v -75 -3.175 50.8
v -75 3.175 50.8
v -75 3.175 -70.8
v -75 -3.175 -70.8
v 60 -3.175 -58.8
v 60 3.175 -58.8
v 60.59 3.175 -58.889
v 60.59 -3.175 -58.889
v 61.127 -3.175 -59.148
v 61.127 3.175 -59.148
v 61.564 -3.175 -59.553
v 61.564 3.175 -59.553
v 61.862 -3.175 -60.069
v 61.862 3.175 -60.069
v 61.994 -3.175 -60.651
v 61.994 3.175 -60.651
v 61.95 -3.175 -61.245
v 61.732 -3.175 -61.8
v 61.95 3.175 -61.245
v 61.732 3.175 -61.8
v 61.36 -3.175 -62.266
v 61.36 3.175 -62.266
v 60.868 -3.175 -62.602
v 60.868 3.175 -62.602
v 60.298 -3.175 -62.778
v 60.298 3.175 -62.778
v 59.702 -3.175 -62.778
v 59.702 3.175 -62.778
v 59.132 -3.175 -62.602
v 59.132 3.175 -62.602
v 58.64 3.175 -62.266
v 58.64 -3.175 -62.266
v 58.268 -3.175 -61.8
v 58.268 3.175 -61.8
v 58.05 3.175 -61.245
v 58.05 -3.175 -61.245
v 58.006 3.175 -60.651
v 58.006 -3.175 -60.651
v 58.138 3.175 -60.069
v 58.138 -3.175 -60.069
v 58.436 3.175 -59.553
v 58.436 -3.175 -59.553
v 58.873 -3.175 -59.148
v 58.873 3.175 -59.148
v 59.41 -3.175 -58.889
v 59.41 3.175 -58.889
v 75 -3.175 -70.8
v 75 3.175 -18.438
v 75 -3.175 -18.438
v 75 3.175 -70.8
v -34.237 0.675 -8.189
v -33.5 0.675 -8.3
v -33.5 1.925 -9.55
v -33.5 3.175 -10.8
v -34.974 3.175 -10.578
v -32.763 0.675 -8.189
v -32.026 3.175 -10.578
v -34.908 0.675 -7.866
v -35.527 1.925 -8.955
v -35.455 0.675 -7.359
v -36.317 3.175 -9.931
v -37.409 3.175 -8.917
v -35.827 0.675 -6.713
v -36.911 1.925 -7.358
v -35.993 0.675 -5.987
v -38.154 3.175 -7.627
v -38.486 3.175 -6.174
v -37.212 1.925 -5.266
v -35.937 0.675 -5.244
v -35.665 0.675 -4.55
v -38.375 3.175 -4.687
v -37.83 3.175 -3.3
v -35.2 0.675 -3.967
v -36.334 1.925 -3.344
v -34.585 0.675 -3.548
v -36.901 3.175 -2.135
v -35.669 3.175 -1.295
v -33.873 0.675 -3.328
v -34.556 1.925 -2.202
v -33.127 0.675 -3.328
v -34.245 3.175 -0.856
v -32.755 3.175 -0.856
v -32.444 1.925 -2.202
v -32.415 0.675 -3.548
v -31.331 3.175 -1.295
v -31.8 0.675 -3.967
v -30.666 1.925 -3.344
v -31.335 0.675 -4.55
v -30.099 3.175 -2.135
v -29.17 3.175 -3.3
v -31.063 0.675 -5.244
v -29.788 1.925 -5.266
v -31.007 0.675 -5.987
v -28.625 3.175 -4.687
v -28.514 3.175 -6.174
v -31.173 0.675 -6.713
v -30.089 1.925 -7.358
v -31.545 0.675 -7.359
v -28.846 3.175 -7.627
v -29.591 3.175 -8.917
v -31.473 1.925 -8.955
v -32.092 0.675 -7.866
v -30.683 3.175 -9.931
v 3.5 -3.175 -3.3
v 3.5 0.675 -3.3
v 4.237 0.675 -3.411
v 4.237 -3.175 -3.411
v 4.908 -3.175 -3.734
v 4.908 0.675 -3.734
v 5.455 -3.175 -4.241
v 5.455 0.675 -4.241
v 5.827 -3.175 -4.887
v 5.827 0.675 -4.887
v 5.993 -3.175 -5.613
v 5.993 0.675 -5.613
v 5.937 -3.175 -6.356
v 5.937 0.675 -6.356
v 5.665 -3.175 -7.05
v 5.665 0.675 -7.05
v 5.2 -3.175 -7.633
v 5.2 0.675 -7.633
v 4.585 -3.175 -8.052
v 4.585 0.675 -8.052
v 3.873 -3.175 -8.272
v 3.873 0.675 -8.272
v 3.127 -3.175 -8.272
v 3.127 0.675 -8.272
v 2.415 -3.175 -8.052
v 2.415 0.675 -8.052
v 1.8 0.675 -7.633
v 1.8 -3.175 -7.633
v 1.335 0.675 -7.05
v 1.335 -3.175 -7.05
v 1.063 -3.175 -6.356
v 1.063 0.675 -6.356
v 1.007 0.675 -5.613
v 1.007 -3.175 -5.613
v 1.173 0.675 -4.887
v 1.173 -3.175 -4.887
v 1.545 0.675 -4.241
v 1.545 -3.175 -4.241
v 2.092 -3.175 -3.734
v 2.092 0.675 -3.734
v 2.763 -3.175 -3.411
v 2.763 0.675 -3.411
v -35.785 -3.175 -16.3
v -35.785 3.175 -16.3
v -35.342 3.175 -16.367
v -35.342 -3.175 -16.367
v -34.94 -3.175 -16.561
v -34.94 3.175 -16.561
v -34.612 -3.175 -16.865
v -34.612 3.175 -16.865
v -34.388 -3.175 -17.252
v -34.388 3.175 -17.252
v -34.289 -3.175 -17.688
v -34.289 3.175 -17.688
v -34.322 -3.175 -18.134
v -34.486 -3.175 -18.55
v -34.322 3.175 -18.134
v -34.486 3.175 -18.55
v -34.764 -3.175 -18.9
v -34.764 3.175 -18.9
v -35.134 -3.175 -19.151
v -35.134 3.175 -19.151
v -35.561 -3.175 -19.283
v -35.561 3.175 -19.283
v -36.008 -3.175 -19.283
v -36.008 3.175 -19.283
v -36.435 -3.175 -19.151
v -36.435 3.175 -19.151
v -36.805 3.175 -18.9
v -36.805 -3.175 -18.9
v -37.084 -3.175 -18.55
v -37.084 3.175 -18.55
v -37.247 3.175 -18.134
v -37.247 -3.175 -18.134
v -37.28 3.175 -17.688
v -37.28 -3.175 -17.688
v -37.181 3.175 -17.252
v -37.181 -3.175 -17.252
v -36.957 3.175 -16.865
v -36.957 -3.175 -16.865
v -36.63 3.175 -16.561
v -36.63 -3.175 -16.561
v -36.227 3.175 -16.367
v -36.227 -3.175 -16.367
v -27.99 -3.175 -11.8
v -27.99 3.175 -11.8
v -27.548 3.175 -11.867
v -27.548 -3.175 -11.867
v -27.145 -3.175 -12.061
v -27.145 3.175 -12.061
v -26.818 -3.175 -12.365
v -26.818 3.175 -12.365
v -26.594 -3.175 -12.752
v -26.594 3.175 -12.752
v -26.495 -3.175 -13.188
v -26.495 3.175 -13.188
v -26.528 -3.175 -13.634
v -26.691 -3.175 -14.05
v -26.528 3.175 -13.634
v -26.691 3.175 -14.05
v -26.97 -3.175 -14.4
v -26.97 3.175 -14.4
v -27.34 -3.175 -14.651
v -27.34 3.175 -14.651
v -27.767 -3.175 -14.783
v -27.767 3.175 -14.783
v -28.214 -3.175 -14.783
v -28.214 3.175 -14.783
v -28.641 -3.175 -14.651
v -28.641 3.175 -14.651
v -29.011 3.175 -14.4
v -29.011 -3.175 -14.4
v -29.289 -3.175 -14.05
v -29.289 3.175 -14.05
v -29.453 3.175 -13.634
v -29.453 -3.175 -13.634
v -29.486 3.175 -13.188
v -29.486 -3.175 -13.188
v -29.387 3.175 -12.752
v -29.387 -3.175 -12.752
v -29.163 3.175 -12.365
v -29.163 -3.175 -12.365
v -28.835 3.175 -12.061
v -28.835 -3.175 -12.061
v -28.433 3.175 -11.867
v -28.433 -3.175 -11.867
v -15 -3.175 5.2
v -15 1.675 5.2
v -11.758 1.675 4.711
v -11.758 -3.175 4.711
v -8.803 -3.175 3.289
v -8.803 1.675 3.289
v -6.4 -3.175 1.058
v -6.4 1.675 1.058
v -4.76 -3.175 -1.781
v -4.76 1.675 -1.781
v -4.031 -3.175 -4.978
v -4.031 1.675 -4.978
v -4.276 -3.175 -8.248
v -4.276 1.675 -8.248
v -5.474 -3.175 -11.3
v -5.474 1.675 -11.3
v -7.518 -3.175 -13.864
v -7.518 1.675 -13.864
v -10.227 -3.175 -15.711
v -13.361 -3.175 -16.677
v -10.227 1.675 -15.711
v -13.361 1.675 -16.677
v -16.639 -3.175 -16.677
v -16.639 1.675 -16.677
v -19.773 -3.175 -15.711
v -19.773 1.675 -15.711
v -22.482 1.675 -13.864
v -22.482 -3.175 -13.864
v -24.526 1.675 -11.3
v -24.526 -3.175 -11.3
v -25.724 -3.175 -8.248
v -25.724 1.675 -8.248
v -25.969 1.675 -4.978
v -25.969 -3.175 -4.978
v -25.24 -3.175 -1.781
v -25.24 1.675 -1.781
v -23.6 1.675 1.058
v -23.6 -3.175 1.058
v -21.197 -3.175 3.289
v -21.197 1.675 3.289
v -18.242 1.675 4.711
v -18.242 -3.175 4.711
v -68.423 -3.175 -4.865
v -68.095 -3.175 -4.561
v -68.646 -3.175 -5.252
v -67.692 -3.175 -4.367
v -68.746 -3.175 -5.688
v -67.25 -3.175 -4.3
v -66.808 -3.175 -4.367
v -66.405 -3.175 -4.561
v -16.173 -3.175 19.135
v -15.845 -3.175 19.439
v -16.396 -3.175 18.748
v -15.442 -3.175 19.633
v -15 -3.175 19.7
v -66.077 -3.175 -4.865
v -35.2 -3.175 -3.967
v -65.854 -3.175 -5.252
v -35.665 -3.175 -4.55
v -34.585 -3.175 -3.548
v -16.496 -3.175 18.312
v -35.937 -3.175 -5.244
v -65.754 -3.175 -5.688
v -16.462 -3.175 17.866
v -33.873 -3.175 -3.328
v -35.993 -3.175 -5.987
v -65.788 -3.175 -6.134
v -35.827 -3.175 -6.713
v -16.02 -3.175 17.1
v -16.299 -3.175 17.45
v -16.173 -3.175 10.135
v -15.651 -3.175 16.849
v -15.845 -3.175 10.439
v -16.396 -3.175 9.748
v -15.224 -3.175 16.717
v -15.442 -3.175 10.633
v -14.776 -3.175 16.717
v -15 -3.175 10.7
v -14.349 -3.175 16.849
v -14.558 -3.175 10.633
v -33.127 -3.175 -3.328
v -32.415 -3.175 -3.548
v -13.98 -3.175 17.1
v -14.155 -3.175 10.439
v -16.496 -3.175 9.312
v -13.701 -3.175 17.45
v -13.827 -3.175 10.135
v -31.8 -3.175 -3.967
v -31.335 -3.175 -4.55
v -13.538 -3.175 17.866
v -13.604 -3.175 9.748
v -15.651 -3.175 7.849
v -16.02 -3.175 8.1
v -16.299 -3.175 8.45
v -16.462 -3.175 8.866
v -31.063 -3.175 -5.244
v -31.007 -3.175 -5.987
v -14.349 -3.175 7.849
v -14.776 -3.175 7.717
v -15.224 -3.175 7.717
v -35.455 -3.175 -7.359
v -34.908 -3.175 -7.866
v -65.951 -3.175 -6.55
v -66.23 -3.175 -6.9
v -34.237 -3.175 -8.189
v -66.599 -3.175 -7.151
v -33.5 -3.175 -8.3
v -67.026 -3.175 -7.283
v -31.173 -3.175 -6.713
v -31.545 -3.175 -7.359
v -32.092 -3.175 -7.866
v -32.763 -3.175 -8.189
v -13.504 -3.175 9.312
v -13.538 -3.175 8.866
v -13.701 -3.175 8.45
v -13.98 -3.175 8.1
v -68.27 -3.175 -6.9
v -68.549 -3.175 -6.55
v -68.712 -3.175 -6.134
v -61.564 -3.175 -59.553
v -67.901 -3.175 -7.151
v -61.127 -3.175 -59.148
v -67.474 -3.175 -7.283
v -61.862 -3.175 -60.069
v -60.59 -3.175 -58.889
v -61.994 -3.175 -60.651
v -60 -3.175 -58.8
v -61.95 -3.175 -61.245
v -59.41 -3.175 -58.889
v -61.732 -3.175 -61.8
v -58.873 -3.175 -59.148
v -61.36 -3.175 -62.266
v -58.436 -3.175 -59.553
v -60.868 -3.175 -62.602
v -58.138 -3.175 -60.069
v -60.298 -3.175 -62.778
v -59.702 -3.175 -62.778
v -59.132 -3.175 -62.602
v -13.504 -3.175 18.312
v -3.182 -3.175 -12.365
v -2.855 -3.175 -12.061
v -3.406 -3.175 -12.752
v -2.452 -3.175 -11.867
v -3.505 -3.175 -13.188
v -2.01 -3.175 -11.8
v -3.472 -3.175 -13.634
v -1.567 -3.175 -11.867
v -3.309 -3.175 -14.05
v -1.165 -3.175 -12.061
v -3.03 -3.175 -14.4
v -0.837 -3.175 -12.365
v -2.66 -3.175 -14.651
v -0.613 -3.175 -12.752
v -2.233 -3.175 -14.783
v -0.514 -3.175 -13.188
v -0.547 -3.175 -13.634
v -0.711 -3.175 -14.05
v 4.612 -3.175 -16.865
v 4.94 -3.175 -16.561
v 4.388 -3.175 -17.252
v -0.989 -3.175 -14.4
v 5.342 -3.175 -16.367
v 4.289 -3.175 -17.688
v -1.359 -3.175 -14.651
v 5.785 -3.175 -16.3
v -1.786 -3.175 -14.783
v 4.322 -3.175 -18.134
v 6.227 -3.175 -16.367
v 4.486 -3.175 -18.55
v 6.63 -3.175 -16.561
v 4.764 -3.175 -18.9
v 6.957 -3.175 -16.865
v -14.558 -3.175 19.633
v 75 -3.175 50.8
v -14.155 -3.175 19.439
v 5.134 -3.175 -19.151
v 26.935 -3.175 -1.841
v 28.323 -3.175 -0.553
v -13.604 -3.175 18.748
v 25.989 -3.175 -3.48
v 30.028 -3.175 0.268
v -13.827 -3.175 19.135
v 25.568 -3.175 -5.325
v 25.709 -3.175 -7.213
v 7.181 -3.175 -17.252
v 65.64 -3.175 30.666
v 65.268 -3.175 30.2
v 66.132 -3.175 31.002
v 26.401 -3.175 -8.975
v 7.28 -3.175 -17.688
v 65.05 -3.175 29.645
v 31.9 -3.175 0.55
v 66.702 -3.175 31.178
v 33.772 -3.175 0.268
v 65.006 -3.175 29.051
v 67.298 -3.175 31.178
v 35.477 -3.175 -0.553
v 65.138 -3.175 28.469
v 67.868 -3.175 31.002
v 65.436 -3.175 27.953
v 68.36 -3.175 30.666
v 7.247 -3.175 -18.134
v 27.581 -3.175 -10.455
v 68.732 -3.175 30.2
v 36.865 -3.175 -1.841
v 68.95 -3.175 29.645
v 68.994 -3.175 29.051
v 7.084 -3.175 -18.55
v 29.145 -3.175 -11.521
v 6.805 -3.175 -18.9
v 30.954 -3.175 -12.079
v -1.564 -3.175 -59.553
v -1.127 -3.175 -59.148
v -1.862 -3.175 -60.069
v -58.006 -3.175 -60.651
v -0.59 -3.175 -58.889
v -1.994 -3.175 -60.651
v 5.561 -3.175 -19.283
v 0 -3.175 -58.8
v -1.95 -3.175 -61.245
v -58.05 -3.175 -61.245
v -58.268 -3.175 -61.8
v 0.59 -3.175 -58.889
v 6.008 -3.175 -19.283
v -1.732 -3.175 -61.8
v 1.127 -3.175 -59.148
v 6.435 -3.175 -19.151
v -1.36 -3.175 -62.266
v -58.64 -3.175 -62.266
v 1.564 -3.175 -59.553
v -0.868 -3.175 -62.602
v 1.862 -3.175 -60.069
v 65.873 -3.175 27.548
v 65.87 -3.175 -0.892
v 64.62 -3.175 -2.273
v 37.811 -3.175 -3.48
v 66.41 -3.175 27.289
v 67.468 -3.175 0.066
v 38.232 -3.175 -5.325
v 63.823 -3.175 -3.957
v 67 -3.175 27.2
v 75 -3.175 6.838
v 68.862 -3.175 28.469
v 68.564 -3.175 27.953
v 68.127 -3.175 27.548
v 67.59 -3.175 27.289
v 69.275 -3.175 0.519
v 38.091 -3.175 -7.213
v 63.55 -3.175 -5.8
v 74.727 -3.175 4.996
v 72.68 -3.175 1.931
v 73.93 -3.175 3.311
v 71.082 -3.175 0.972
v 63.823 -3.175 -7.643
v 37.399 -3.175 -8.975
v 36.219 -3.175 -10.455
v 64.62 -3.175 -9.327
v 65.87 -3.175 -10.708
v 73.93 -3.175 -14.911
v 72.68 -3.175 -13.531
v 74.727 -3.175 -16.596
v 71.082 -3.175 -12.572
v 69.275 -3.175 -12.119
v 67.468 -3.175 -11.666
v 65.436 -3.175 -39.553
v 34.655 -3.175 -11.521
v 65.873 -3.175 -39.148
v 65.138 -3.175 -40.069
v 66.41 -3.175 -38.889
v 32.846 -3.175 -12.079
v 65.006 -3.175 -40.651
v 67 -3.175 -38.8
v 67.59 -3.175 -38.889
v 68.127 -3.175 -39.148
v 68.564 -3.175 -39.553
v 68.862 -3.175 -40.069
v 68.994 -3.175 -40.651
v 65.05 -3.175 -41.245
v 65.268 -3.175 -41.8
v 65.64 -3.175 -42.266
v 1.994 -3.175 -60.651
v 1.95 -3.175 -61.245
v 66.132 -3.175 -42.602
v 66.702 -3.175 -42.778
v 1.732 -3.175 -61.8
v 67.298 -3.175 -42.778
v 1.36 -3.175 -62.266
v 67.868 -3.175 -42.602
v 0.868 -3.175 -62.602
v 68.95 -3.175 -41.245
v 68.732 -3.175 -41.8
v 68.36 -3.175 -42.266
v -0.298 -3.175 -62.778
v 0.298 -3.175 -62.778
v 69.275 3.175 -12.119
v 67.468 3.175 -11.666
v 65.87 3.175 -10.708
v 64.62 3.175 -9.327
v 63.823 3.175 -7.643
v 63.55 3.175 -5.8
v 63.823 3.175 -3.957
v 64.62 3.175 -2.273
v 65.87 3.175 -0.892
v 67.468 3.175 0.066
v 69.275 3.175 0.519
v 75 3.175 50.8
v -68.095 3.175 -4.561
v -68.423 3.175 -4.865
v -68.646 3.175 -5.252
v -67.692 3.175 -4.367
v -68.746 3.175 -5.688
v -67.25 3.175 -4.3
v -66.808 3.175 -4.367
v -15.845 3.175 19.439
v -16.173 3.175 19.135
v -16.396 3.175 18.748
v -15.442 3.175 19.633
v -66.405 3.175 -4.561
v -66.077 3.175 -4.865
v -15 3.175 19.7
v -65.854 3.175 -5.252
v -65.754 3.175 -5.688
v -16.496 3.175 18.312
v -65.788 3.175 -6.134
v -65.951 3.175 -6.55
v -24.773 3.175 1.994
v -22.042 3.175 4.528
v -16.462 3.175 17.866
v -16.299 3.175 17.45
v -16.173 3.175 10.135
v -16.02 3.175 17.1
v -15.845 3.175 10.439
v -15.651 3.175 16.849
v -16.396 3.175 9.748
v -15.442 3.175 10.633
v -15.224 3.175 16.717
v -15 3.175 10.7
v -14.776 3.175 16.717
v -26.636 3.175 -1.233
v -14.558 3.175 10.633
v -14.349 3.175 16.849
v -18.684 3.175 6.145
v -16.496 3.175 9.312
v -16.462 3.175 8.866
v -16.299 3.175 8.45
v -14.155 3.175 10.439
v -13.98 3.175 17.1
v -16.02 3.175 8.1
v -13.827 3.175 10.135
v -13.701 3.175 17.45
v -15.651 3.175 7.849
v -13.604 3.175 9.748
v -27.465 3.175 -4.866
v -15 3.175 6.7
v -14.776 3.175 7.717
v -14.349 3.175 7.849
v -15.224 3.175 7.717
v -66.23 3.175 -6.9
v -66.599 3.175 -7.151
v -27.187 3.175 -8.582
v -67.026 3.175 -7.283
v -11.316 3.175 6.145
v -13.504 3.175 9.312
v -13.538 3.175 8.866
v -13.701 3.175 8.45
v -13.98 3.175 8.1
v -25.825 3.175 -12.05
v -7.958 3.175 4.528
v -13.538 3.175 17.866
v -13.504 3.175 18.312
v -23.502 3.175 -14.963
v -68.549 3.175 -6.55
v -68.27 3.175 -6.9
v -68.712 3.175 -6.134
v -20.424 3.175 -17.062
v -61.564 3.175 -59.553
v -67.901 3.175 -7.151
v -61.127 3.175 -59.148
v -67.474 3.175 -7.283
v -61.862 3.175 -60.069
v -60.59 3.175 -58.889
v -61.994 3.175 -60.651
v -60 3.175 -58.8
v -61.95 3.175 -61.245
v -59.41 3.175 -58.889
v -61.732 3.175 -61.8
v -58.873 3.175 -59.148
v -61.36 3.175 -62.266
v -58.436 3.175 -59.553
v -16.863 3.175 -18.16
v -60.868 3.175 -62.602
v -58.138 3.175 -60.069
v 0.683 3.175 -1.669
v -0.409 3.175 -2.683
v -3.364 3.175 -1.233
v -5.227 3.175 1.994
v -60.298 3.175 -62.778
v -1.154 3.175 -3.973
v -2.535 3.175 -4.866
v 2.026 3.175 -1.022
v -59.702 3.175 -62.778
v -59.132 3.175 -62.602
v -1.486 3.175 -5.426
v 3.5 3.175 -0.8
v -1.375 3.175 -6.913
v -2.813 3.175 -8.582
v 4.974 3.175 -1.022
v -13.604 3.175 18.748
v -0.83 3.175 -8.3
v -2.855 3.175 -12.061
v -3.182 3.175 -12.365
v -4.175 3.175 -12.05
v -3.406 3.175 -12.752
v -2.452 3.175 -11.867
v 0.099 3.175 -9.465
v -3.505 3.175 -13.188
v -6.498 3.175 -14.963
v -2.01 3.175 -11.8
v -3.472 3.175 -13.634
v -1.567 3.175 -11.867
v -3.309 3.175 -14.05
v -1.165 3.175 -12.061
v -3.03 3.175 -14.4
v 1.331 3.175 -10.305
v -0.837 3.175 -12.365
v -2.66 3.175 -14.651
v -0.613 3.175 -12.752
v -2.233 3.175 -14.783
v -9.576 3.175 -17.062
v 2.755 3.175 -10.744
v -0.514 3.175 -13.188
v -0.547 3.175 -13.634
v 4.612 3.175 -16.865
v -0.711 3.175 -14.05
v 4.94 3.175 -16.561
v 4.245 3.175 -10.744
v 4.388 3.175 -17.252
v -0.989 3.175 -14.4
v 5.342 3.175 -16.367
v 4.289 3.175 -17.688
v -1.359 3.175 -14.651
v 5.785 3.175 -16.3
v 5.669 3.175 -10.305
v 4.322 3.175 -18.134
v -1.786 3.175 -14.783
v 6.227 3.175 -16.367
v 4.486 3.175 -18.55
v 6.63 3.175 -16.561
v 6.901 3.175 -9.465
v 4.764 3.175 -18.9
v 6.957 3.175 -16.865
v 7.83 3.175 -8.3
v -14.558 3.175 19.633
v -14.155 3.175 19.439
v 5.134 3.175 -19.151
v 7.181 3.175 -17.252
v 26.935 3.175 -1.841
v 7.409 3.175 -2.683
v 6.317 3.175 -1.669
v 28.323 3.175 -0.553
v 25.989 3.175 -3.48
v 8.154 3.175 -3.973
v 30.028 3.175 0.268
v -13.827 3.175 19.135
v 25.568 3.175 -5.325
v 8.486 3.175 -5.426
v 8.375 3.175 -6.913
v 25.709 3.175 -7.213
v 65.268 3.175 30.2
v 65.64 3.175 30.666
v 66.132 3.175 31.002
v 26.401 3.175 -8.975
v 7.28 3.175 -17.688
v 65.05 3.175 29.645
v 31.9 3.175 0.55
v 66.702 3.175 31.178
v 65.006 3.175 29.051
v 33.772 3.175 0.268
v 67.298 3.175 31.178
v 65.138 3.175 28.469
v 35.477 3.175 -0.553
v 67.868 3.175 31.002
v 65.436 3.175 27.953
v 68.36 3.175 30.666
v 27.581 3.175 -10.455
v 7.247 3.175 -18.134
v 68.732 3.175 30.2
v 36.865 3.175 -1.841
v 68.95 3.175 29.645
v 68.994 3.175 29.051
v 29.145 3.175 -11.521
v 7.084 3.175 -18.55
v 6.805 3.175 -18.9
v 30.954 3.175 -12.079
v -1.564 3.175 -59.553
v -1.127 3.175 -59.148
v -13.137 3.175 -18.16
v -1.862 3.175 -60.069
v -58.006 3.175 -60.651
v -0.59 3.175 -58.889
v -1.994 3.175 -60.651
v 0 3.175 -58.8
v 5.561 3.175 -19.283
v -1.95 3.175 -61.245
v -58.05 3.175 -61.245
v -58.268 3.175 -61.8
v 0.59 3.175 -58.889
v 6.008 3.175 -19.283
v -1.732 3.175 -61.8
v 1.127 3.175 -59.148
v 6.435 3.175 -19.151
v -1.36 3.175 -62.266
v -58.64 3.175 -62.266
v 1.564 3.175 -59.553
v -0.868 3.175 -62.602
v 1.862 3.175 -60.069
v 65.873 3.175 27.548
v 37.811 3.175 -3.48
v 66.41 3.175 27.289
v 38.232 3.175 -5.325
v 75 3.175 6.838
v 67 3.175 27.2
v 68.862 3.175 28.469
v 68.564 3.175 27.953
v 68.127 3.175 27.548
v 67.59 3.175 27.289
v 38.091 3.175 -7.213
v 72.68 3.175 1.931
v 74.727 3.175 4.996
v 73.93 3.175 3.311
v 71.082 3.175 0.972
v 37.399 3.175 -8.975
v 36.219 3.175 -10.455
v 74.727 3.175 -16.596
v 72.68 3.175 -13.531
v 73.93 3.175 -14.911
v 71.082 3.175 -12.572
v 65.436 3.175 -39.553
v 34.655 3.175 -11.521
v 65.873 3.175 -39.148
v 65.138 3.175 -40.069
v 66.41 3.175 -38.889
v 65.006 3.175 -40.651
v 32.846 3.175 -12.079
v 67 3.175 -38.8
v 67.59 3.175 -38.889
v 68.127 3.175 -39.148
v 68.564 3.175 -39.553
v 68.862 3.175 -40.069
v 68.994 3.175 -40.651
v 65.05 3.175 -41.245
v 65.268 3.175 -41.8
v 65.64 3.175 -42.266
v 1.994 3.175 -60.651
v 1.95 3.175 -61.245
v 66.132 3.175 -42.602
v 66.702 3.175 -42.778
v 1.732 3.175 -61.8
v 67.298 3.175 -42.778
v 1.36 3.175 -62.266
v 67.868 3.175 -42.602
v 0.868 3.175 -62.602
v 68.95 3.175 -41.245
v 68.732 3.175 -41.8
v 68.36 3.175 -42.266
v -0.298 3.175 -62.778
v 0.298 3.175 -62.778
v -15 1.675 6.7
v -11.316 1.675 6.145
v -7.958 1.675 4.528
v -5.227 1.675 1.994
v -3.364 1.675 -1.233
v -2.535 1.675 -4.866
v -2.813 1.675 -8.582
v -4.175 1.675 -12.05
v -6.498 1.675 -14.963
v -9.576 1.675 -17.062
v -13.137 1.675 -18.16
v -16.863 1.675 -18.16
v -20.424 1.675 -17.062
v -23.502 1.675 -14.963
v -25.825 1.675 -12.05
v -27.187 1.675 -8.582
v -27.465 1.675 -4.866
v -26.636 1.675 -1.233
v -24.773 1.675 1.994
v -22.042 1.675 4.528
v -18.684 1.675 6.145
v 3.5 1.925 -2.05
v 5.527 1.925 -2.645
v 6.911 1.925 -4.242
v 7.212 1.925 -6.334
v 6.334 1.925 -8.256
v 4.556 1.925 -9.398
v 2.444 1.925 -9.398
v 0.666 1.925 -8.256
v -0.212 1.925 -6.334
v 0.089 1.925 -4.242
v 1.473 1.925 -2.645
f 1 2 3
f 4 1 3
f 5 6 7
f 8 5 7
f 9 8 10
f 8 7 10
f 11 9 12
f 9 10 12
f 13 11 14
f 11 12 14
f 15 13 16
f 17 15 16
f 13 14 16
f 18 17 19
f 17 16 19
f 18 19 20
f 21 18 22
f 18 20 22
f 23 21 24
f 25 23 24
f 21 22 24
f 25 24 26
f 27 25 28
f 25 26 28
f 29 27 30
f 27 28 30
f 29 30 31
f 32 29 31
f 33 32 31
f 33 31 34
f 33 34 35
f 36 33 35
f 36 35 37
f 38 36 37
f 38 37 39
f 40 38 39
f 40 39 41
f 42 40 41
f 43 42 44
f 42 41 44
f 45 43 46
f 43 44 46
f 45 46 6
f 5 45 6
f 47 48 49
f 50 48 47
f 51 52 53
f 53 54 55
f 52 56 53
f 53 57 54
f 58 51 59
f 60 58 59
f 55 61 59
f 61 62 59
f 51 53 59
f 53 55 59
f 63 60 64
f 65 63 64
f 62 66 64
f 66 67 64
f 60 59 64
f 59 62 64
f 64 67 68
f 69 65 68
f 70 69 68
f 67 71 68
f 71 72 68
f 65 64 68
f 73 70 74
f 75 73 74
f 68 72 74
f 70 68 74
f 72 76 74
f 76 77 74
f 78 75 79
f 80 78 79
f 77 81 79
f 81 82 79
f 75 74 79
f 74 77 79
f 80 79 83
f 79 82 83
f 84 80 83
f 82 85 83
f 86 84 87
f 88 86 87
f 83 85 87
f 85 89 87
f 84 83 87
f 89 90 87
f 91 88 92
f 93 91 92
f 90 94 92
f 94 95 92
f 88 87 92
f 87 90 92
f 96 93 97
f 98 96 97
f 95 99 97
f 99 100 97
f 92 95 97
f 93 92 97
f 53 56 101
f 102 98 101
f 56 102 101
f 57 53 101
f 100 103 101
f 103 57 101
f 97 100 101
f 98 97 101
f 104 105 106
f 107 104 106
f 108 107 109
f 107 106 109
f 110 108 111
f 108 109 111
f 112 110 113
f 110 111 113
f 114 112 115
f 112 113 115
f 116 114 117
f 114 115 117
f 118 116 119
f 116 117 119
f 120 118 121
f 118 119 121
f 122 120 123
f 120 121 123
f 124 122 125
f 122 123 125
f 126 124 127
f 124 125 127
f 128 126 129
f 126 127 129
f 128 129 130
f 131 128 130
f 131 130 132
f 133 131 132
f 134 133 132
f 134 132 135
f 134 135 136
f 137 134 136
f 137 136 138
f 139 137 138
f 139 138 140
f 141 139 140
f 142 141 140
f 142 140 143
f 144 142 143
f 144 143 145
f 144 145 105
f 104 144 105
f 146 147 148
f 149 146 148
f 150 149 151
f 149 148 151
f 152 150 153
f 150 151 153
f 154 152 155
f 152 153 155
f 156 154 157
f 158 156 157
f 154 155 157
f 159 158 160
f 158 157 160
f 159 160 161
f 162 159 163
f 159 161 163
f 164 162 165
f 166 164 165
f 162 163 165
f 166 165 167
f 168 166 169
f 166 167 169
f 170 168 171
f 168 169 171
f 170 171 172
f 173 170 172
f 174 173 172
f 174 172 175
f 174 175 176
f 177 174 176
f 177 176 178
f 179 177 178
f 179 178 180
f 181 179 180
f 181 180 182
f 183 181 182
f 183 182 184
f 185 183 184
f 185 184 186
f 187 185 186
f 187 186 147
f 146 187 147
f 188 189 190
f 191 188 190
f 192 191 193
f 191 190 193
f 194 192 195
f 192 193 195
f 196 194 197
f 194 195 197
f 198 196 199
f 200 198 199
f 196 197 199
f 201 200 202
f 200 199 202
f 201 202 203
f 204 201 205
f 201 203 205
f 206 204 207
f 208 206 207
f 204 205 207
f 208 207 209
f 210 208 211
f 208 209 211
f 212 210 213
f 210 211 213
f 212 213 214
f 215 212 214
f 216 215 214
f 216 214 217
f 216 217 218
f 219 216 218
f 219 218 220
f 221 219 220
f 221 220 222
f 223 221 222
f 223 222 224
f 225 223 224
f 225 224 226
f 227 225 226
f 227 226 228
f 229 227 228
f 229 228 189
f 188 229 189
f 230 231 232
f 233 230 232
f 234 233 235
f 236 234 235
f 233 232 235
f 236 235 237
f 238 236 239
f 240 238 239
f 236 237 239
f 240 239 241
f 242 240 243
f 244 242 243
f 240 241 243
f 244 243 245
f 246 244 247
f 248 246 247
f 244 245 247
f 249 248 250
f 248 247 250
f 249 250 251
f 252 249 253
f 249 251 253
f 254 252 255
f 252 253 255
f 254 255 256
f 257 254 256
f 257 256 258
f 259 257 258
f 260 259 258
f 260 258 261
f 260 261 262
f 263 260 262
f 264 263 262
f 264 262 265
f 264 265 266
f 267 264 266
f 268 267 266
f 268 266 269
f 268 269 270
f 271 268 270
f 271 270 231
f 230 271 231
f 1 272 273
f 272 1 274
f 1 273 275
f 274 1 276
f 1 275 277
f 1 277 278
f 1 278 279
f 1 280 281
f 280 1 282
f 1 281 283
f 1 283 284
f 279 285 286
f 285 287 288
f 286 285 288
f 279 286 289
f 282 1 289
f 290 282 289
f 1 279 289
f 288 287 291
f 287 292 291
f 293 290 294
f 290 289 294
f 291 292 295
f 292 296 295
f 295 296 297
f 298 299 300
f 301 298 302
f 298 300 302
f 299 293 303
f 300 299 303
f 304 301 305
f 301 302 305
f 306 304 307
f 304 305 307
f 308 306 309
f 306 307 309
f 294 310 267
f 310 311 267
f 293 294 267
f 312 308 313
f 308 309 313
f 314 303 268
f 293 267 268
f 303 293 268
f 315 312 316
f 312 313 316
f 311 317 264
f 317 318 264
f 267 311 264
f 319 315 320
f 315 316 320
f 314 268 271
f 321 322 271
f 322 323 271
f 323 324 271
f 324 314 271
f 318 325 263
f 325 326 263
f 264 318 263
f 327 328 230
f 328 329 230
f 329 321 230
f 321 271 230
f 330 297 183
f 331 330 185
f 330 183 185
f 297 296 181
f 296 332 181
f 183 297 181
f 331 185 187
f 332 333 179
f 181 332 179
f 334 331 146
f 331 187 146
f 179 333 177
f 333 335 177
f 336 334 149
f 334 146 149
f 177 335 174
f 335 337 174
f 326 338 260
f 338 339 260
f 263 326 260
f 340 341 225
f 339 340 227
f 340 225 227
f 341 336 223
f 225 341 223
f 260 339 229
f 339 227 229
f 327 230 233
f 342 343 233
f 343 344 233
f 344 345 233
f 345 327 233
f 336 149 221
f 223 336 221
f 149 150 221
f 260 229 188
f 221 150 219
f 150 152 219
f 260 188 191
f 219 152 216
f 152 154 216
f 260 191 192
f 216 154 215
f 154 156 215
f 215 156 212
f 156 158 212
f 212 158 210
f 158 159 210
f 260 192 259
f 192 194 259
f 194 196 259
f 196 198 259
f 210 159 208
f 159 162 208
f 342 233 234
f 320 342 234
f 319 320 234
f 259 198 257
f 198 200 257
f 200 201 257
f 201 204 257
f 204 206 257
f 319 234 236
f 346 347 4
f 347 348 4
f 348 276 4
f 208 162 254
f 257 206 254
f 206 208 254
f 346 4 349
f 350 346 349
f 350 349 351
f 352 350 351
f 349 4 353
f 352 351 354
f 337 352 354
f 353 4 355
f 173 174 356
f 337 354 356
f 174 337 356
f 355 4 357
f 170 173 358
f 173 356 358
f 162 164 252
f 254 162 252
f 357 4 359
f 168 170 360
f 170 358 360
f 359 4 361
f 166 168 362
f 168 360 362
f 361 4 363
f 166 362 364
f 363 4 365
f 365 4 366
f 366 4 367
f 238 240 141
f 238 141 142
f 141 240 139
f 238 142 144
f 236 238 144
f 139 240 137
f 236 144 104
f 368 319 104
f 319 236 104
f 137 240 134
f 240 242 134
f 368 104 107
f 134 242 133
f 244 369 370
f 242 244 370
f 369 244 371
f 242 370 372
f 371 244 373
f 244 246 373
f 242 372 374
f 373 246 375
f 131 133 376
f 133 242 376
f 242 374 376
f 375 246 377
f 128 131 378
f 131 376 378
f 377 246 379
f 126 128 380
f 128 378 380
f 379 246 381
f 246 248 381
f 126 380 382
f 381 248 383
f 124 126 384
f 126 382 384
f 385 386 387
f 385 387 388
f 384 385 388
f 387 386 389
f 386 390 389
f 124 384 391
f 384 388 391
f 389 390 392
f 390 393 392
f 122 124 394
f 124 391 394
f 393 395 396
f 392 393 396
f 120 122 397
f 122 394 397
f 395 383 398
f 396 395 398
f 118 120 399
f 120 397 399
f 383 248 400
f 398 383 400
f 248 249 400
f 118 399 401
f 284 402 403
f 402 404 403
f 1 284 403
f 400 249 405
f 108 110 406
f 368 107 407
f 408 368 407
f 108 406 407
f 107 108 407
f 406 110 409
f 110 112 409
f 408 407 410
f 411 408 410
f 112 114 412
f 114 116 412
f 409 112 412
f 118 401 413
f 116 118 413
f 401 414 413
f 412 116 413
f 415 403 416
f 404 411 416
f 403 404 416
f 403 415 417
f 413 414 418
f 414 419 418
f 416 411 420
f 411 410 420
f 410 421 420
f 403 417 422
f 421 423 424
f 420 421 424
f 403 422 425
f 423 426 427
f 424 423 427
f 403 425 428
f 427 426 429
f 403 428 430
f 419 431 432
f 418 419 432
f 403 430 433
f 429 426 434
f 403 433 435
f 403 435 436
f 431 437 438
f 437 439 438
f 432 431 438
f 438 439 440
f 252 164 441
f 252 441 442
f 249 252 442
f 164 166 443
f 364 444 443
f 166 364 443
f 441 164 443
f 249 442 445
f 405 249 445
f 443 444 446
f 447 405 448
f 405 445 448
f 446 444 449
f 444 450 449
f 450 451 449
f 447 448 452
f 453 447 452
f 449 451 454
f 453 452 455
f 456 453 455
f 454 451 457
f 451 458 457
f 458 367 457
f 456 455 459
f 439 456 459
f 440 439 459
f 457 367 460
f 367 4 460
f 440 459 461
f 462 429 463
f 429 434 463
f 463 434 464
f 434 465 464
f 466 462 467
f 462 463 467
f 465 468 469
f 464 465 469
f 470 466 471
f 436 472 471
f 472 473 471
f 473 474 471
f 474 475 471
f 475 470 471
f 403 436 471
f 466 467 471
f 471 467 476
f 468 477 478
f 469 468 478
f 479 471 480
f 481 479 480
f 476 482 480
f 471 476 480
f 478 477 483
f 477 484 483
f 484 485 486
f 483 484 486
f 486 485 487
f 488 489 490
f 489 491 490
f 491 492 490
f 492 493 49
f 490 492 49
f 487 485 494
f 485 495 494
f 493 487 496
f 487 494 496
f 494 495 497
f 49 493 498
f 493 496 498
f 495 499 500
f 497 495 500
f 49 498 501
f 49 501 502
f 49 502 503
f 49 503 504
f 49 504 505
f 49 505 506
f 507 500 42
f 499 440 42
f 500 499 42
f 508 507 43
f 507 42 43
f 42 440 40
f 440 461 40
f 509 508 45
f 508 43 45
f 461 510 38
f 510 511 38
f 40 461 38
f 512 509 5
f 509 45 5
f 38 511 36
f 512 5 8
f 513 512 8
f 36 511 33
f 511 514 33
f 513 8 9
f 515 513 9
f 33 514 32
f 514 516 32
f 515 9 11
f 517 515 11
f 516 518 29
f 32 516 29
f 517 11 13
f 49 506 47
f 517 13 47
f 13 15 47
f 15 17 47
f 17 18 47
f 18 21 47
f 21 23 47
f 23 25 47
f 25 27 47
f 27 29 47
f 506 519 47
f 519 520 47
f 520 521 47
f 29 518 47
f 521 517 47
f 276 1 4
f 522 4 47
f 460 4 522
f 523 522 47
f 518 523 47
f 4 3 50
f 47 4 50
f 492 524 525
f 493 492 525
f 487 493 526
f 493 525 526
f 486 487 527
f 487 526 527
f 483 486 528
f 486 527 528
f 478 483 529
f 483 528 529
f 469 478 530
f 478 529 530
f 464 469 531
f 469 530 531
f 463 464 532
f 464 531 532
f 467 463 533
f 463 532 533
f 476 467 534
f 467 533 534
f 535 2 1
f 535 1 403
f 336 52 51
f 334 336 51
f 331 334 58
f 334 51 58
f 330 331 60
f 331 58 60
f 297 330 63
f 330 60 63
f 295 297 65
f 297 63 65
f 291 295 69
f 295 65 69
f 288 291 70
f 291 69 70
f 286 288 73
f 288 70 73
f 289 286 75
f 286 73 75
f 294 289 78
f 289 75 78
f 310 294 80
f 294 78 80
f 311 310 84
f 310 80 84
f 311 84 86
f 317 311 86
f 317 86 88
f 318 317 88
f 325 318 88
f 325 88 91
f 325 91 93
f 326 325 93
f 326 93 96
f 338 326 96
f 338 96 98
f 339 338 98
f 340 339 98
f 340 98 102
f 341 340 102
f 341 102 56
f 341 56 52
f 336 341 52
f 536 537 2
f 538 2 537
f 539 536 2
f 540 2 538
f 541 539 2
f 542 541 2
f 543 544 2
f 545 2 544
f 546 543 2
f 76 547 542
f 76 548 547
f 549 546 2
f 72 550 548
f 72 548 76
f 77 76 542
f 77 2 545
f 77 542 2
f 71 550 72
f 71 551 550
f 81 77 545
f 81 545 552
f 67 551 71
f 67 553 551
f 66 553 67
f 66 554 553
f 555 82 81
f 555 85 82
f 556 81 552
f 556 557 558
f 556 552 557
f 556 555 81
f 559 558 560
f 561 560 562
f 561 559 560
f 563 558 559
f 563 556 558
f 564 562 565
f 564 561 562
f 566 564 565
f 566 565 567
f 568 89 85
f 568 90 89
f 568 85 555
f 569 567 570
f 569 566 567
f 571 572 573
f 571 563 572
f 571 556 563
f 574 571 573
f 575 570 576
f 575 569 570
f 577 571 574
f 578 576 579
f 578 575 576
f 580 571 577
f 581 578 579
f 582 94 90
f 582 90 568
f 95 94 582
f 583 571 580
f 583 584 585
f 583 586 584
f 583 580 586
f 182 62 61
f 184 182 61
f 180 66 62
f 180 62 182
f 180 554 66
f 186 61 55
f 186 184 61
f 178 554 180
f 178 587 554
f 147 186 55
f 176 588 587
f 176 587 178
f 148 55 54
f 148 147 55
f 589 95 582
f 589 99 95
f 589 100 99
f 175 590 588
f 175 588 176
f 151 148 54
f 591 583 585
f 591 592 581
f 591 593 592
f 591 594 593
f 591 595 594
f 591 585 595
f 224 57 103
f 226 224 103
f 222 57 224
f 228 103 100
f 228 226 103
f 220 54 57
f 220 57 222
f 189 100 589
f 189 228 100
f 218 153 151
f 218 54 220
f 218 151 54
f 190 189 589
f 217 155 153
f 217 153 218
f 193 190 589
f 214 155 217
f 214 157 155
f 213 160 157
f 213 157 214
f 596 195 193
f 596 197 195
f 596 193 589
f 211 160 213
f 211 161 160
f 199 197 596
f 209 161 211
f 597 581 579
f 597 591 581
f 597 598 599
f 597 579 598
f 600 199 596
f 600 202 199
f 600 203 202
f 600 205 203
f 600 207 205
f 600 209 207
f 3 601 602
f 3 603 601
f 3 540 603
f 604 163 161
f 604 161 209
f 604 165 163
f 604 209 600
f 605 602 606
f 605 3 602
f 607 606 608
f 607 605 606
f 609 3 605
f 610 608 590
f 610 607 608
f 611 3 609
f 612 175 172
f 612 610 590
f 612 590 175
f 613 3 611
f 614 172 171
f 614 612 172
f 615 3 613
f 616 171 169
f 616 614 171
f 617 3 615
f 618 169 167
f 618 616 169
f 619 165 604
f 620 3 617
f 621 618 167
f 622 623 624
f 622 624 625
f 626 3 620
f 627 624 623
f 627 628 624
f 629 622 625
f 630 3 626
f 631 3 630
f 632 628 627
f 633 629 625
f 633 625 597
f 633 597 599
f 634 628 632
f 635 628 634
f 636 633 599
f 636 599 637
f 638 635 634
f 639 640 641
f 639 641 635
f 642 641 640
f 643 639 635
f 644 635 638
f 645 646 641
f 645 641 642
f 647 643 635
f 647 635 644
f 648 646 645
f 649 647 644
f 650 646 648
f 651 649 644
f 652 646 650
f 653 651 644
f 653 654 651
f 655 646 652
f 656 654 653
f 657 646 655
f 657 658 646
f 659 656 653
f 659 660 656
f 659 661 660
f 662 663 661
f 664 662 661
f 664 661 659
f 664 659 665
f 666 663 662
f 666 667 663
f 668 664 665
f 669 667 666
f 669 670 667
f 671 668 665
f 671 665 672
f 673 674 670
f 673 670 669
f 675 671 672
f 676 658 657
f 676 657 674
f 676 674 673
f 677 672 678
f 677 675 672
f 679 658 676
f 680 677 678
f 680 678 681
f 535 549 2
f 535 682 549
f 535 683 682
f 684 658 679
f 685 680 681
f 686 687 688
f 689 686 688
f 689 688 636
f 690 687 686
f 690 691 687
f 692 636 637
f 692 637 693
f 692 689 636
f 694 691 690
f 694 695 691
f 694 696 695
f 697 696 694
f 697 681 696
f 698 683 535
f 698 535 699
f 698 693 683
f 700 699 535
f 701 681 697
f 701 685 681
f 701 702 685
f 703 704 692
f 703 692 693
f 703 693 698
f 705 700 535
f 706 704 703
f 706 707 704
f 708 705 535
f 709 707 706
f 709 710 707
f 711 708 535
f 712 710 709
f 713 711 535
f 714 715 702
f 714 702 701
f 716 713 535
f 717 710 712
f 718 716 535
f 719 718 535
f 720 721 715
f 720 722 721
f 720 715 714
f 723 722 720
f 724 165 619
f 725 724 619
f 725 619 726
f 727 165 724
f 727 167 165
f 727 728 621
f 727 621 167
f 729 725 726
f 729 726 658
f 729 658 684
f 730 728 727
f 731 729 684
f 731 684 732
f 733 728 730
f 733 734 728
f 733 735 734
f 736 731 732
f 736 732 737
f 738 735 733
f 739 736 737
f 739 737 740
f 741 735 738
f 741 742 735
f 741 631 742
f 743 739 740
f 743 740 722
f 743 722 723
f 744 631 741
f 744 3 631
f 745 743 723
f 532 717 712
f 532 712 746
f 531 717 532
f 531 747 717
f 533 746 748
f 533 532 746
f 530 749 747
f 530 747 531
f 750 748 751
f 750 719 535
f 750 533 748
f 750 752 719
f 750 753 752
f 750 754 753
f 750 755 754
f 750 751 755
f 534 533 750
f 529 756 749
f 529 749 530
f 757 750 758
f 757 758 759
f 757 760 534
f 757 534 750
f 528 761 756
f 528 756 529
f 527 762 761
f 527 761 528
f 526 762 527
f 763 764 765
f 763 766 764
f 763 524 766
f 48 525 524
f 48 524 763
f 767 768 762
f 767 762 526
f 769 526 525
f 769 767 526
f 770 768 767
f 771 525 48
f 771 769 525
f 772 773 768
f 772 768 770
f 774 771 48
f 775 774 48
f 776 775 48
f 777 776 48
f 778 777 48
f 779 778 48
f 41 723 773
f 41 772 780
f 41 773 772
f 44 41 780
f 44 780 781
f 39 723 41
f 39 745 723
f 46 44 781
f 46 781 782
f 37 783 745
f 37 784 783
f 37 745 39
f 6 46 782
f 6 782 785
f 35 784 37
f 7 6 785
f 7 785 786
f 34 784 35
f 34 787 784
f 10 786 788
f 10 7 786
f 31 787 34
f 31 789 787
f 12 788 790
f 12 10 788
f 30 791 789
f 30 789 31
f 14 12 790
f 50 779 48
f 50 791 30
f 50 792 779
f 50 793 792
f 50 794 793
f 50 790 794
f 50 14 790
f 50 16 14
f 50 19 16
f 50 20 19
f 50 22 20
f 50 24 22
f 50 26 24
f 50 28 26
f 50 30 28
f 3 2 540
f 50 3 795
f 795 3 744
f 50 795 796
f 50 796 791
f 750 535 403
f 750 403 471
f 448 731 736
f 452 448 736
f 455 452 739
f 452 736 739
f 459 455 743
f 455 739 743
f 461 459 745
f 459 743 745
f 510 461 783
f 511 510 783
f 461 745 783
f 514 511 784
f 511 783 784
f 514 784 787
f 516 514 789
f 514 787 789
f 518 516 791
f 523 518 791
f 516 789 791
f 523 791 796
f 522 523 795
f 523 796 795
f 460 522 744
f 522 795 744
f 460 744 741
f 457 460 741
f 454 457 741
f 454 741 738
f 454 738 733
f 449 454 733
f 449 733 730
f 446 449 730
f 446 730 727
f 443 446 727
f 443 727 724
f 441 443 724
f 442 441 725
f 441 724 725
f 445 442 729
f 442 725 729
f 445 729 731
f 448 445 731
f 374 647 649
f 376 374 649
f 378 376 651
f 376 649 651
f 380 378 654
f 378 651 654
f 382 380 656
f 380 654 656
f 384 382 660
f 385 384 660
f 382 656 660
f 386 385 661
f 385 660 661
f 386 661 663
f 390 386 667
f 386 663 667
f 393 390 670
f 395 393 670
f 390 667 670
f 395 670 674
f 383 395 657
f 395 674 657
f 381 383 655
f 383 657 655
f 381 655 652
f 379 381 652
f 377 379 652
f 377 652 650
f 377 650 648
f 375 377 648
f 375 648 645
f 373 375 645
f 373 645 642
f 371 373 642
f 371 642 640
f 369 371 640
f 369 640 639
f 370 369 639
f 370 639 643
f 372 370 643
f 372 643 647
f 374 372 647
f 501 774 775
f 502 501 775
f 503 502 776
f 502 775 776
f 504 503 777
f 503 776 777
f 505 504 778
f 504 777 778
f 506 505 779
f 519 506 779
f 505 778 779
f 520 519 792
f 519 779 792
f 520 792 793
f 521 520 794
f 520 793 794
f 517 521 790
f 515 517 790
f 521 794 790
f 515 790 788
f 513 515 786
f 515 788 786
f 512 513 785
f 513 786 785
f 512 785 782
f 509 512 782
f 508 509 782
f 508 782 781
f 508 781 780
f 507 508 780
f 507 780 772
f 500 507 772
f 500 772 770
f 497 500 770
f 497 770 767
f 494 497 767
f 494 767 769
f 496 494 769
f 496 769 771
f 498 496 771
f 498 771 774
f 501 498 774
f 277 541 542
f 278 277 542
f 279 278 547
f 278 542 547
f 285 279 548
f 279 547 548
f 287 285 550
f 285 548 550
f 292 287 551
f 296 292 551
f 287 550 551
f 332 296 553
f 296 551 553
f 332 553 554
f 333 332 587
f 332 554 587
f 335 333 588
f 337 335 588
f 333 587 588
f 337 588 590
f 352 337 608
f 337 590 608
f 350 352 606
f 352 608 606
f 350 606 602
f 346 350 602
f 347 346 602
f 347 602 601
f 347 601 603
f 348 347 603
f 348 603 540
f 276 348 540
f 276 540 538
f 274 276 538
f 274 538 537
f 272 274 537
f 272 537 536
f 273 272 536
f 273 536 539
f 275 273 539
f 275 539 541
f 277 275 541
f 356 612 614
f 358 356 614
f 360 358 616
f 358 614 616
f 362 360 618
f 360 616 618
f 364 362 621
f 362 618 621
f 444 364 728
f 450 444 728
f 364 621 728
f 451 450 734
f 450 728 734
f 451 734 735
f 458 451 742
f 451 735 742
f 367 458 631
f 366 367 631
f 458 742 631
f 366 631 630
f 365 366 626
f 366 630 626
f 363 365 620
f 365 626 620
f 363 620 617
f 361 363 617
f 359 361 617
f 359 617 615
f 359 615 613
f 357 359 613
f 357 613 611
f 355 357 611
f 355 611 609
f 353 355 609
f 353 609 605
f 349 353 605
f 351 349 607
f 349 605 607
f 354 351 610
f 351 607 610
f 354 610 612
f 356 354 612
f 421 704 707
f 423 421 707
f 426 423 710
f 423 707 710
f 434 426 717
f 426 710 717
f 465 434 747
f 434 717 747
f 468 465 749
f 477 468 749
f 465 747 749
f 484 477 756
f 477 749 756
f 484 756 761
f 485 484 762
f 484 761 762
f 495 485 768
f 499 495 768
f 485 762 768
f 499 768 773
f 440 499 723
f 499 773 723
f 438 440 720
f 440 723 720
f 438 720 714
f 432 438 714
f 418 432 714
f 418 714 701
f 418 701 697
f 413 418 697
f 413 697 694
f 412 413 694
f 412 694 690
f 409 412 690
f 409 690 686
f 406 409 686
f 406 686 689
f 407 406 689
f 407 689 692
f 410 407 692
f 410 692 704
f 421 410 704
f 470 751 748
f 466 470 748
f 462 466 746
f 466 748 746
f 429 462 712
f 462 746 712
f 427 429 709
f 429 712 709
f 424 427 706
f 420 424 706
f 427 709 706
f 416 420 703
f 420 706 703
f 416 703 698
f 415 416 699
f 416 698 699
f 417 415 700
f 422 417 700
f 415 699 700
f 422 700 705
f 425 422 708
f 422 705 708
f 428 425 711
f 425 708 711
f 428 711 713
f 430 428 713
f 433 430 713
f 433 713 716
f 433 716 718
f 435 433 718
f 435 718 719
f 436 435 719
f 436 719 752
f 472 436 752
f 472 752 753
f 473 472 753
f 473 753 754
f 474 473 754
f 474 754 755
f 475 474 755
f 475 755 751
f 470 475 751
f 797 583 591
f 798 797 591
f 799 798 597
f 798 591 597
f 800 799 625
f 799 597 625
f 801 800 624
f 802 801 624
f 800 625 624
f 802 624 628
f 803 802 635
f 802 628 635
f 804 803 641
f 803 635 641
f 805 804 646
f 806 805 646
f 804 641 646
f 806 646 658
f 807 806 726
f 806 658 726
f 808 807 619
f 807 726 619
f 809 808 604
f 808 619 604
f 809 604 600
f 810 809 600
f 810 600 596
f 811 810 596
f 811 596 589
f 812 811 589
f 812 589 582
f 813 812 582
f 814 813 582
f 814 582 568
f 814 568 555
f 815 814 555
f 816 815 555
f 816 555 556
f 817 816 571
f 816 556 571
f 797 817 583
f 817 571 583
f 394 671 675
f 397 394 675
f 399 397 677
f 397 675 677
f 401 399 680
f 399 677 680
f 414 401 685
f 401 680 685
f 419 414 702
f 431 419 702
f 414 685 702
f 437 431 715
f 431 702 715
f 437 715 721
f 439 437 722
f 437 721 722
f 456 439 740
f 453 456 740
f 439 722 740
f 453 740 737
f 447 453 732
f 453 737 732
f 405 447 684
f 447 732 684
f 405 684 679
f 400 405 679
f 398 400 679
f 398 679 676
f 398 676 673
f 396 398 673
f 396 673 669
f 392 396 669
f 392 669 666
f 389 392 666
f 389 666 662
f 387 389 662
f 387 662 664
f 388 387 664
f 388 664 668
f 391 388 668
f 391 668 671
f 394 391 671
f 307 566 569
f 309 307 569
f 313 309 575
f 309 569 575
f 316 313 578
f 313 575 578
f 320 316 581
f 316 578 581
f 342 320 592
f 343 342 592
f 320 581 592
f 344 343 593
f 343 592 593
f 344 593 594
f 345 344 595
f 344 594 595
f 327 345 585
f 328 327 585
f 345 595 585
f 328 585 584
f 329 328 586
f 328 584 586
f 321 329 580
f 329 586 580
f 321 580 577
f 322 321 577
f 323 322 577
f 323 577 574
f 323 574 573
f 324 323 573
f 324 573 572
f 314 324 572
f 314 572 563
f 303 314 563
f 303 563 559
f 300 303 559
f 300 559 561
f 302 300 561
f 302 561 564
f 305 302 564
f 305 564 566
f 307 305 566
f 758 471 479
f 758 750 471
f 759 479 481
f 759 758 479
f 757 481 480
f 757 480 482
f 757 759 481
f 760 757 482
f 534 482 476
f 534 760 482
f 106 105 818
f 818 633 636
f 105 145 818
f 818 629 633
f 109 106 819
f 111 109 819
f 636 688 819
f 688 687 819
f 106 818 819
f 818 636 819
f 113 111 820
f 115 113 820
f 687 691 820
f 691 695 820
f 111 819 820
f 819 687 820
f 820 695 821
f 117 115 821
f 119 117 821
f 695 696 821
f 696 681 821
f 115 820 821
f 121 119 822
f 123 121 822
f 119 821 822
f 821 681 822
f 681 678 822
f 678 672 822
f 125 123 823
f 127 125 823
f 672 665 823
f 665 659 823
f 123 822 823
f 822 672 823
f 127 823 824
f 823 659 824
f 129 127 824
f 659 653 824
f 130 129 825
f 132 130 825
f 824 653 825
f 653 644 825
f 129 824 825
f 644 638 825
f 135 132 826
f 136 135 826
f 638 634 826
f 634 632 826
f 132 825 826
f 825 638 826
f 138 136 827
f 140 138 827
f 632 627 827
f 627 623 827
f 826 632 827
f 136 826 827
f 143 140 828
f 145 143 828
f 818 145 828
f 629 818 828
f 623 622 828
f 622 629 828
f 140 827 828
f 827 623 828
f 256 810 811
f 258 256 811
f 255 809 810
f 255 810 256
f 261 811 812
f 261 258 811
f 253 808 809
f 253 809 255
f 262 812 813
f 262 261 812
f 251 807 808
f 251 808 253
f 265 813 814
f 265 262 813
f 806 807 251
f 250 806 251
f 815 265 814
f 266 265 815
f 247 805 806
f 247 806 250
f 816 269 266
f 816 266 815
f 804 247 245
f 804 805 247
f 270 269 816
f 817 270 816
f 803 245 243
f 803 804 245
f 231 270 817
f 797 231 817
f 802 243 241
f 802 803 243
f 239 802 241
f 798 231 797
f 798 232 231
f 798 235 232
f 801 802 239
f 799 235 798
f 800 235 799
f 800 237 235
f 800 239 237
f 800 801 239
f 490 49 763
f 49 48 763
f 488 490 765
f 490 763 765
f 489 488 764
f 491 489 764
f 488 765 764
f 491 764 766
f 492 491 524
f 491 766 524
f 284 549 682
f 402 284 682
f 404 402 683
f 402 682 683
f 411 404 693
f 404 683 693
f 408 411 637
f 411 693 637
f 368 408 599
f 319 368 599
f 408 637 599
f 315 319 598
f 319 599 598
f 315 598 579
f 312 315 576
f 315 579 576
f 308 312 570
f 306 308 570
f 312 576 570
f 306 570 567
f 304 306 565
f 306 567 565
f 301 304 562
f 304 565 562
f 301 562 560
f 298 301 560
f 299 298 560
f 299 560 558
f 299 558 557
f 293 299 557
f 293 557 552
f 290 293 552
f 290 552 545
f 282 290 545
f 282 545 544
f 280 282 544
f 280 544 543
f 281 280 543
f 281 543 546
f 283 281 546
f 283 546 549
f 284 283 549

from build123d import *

# Parameters (mm, degrees)
CROQUIS1_W              = 150
CROQUIS1_H              = 101.6
SALIENTE_EXTRUIR1_DEPTH = 3.175
CROQUIS2_R              = 2
CROQUIS2_R_2            = 11
CROQUIS2_R_3            = 1.5
CROQUIS2_R_4            = 6.35
CORTAR_EXTRUIR1_DEPTH   = 91.807282197
REDONDEO1_R             = 6.35
CROQUIS3_R              = 1.5
CORTAR_EXTRUIR2_DEPTH   = 91.807282197
CORTAR_EXTRUIR3_START   = 3.175
CROQUIS4_R              = 12.5
CORTAR_EXTRUIR3_DEPTH   = 1.5
CROQUIS9_R              = 2.5
CORTAR_EXTRUIR6_DEPTH   = 91.807282197
CHAFL_N1_SIZE           = 2.5
CROQUIS10_W             = 150
CROQUIS10_H             = 20
CROQUIS10_R             = 2
SALIENTE_EXTRUIR2_DEPTH = 6.35


with BuildPart() as part:
    # Croquis1 → Saliente-Extruir1 (new, symmetric)
    with BuildSketch(Plane(origin=(0, 0, 0), x_dir=(1, 0, 0), z_dir=(0, 1, 0))):
        Rectangle(CROQUIS1_W, CROQUIS1_H)
    extrude(amount=SALIENTE_EXTRUIR1_DEPTH, both=True)

    # Croquis2 → Cortar-Extruir1 (cut, through all)
    with BuildSketch(Plane(origin=(0, 3.175, 0), x_dir=(1, 0, 0), z_dir=(0, 1, 0))):
        with Locations(Location((67, 40.8, 0), (0, 0, 270))):
            Circle(CROQUIS2_R)
        with Locations(Location((67, -29.2, 0), (0, 0, 90))):
            Circle(CROQUIS2_R)
        with Locations(Location((-15, 5.8, 0), (0, 0, 270))):
            Circle(CROQUIS2_R_2)
        with Locations(Location((-67.25, 5.8, 0), (0, 0, 270))):
            Circle(CROQUIS2_R_3)
        with Locations(Location((31.9, 5.8, 0), (0, 0, 270))):
            Circle(CROQUIS2_R_4)
        with Locations((69.9, 5.8)):
            Circle(CROQUIS2_R_4)
    extrude(amount=-CORTAR_EXTRUIR1_DEPTH, mode=Mode.SUBTRACT)

    # Redondeo1
    redondeo1_edges = [part.edges().sort_by_distance(p)[0] for p in [
        (75, 0, -2.016813512),
        (75, 0, -9.583186488),
    ]]
    fillet(redondeo1_edges, radius=REDONDEO1_R)

    # Croquis3 → Cortar-Extruir2 (cut, through all)
    with BuildSketch(Plane(origin=(0, 3.175, 0), x_dir=(1, 0, 0), z_dir=(0, 1, 0))):
        with Locations(Location((-15, -9.2, 0), (0, 0, 270))):
            Circle(CROQUIS3_R)
        with Locations(Location((-15, -18.2, 0), (0, 0, 270))):
            Circle(CROQUIS3_R)
        with Locations(Location((-27.990381057, 13.3, 0), (0, 0, 270))):
            Circle(CROQUIS3_R)
        with Locations(Location((-35.784609691, 17.8, 0), (0, 0, 270))):
            Circle(CROQUIS3_R)
        with Locations(Location((-2.009618943, 13.3, 0), (0, 0, 270))):
            Circle(CROQUIS3_R)
        with Locations(Location((5.784609691, 17.8, 0), (0, 0, 270))):
            Circle(CROQUIS3_R)
    extrude(amount=-CORTAR_EXTRUIR2_DEPTH, mode=Mode.SUBTRACT)

    # Croquis4 → Cortar-Extruir3 (cut)
    with BuildSketch(Plane(origin=(0, 0, 0), x_dir=(1, 0, 0), z_dir=(0, 1, 0)).offset(CORTAR_EXTRUIR3_START)):
        with Locations(Location((-15, 5.8, 0), (0, 0, 270))):
            Circle(CROQUIS4_R)
    extrude(amount=-CORTAR_EXTRUIR3_DEPTH, mode=Mode.SUBTRACT)

    # Croquis9 → Cortar-Extruir6 (cut, through all)
    with BuildSketch(Plane(origin=(0, 3.175, 0), x_dir=(1, 0, 0), z_dir=(0, 1, 0))):
        with Locations(Location((3.5, 5.8, 0), (0, 0, 270))):
            Circle(CROQUIS9_R)
        with Locations(Location((-33.5, 5.8, 0), (0, 0, 90))):
            Circle(CROQUIS9_R)
    extrude(amount=-CORTAR_EXTRUIR6_DEPTH, mode=Mode.SUBTRACT)

    # Chaflán1
    chafl_n1_edges = [part.edges().sort_by_distance(p)[0] for p in [
        (3.5, 3.175, -8.3),
        (-33.5, 3.175, -3.3),
    ]]
    chamfer(chafl_n1_edges, length=CHAFL_N1_SIZE)

    # Croquis10 → Saliente-Extruir2 (add)
    with BuildSketch(Plane(origin=(0, 3.175, 0), x_dir=(1, 0, 0), z_dir=(0, 1, 0))):
        with Locations((0, 60.8)):
            Rectangle(CROQUIS10_W, CROQUIS10_H)
        with Locations(Location((0, 60.8, 0), (0, 0, 270))):
            Circle(CROQUIS10_R, mode=Mode.SUBTRACT)
        with Locations(Location((-60, 60.8, 0), (0, 0, 270))):
            Circle(CROQUIS10_R, mode=Mode.SUBTRACT)
        with Locations(Location((60, 60.8, 0), (0, 0, 270))):
            Circle(CROQUIS10_R, mode=Mode.SUBTRACT)
    extrude(amount=-SALIENTE_EXTRUIR2_DEPTH)


solid = part.part
